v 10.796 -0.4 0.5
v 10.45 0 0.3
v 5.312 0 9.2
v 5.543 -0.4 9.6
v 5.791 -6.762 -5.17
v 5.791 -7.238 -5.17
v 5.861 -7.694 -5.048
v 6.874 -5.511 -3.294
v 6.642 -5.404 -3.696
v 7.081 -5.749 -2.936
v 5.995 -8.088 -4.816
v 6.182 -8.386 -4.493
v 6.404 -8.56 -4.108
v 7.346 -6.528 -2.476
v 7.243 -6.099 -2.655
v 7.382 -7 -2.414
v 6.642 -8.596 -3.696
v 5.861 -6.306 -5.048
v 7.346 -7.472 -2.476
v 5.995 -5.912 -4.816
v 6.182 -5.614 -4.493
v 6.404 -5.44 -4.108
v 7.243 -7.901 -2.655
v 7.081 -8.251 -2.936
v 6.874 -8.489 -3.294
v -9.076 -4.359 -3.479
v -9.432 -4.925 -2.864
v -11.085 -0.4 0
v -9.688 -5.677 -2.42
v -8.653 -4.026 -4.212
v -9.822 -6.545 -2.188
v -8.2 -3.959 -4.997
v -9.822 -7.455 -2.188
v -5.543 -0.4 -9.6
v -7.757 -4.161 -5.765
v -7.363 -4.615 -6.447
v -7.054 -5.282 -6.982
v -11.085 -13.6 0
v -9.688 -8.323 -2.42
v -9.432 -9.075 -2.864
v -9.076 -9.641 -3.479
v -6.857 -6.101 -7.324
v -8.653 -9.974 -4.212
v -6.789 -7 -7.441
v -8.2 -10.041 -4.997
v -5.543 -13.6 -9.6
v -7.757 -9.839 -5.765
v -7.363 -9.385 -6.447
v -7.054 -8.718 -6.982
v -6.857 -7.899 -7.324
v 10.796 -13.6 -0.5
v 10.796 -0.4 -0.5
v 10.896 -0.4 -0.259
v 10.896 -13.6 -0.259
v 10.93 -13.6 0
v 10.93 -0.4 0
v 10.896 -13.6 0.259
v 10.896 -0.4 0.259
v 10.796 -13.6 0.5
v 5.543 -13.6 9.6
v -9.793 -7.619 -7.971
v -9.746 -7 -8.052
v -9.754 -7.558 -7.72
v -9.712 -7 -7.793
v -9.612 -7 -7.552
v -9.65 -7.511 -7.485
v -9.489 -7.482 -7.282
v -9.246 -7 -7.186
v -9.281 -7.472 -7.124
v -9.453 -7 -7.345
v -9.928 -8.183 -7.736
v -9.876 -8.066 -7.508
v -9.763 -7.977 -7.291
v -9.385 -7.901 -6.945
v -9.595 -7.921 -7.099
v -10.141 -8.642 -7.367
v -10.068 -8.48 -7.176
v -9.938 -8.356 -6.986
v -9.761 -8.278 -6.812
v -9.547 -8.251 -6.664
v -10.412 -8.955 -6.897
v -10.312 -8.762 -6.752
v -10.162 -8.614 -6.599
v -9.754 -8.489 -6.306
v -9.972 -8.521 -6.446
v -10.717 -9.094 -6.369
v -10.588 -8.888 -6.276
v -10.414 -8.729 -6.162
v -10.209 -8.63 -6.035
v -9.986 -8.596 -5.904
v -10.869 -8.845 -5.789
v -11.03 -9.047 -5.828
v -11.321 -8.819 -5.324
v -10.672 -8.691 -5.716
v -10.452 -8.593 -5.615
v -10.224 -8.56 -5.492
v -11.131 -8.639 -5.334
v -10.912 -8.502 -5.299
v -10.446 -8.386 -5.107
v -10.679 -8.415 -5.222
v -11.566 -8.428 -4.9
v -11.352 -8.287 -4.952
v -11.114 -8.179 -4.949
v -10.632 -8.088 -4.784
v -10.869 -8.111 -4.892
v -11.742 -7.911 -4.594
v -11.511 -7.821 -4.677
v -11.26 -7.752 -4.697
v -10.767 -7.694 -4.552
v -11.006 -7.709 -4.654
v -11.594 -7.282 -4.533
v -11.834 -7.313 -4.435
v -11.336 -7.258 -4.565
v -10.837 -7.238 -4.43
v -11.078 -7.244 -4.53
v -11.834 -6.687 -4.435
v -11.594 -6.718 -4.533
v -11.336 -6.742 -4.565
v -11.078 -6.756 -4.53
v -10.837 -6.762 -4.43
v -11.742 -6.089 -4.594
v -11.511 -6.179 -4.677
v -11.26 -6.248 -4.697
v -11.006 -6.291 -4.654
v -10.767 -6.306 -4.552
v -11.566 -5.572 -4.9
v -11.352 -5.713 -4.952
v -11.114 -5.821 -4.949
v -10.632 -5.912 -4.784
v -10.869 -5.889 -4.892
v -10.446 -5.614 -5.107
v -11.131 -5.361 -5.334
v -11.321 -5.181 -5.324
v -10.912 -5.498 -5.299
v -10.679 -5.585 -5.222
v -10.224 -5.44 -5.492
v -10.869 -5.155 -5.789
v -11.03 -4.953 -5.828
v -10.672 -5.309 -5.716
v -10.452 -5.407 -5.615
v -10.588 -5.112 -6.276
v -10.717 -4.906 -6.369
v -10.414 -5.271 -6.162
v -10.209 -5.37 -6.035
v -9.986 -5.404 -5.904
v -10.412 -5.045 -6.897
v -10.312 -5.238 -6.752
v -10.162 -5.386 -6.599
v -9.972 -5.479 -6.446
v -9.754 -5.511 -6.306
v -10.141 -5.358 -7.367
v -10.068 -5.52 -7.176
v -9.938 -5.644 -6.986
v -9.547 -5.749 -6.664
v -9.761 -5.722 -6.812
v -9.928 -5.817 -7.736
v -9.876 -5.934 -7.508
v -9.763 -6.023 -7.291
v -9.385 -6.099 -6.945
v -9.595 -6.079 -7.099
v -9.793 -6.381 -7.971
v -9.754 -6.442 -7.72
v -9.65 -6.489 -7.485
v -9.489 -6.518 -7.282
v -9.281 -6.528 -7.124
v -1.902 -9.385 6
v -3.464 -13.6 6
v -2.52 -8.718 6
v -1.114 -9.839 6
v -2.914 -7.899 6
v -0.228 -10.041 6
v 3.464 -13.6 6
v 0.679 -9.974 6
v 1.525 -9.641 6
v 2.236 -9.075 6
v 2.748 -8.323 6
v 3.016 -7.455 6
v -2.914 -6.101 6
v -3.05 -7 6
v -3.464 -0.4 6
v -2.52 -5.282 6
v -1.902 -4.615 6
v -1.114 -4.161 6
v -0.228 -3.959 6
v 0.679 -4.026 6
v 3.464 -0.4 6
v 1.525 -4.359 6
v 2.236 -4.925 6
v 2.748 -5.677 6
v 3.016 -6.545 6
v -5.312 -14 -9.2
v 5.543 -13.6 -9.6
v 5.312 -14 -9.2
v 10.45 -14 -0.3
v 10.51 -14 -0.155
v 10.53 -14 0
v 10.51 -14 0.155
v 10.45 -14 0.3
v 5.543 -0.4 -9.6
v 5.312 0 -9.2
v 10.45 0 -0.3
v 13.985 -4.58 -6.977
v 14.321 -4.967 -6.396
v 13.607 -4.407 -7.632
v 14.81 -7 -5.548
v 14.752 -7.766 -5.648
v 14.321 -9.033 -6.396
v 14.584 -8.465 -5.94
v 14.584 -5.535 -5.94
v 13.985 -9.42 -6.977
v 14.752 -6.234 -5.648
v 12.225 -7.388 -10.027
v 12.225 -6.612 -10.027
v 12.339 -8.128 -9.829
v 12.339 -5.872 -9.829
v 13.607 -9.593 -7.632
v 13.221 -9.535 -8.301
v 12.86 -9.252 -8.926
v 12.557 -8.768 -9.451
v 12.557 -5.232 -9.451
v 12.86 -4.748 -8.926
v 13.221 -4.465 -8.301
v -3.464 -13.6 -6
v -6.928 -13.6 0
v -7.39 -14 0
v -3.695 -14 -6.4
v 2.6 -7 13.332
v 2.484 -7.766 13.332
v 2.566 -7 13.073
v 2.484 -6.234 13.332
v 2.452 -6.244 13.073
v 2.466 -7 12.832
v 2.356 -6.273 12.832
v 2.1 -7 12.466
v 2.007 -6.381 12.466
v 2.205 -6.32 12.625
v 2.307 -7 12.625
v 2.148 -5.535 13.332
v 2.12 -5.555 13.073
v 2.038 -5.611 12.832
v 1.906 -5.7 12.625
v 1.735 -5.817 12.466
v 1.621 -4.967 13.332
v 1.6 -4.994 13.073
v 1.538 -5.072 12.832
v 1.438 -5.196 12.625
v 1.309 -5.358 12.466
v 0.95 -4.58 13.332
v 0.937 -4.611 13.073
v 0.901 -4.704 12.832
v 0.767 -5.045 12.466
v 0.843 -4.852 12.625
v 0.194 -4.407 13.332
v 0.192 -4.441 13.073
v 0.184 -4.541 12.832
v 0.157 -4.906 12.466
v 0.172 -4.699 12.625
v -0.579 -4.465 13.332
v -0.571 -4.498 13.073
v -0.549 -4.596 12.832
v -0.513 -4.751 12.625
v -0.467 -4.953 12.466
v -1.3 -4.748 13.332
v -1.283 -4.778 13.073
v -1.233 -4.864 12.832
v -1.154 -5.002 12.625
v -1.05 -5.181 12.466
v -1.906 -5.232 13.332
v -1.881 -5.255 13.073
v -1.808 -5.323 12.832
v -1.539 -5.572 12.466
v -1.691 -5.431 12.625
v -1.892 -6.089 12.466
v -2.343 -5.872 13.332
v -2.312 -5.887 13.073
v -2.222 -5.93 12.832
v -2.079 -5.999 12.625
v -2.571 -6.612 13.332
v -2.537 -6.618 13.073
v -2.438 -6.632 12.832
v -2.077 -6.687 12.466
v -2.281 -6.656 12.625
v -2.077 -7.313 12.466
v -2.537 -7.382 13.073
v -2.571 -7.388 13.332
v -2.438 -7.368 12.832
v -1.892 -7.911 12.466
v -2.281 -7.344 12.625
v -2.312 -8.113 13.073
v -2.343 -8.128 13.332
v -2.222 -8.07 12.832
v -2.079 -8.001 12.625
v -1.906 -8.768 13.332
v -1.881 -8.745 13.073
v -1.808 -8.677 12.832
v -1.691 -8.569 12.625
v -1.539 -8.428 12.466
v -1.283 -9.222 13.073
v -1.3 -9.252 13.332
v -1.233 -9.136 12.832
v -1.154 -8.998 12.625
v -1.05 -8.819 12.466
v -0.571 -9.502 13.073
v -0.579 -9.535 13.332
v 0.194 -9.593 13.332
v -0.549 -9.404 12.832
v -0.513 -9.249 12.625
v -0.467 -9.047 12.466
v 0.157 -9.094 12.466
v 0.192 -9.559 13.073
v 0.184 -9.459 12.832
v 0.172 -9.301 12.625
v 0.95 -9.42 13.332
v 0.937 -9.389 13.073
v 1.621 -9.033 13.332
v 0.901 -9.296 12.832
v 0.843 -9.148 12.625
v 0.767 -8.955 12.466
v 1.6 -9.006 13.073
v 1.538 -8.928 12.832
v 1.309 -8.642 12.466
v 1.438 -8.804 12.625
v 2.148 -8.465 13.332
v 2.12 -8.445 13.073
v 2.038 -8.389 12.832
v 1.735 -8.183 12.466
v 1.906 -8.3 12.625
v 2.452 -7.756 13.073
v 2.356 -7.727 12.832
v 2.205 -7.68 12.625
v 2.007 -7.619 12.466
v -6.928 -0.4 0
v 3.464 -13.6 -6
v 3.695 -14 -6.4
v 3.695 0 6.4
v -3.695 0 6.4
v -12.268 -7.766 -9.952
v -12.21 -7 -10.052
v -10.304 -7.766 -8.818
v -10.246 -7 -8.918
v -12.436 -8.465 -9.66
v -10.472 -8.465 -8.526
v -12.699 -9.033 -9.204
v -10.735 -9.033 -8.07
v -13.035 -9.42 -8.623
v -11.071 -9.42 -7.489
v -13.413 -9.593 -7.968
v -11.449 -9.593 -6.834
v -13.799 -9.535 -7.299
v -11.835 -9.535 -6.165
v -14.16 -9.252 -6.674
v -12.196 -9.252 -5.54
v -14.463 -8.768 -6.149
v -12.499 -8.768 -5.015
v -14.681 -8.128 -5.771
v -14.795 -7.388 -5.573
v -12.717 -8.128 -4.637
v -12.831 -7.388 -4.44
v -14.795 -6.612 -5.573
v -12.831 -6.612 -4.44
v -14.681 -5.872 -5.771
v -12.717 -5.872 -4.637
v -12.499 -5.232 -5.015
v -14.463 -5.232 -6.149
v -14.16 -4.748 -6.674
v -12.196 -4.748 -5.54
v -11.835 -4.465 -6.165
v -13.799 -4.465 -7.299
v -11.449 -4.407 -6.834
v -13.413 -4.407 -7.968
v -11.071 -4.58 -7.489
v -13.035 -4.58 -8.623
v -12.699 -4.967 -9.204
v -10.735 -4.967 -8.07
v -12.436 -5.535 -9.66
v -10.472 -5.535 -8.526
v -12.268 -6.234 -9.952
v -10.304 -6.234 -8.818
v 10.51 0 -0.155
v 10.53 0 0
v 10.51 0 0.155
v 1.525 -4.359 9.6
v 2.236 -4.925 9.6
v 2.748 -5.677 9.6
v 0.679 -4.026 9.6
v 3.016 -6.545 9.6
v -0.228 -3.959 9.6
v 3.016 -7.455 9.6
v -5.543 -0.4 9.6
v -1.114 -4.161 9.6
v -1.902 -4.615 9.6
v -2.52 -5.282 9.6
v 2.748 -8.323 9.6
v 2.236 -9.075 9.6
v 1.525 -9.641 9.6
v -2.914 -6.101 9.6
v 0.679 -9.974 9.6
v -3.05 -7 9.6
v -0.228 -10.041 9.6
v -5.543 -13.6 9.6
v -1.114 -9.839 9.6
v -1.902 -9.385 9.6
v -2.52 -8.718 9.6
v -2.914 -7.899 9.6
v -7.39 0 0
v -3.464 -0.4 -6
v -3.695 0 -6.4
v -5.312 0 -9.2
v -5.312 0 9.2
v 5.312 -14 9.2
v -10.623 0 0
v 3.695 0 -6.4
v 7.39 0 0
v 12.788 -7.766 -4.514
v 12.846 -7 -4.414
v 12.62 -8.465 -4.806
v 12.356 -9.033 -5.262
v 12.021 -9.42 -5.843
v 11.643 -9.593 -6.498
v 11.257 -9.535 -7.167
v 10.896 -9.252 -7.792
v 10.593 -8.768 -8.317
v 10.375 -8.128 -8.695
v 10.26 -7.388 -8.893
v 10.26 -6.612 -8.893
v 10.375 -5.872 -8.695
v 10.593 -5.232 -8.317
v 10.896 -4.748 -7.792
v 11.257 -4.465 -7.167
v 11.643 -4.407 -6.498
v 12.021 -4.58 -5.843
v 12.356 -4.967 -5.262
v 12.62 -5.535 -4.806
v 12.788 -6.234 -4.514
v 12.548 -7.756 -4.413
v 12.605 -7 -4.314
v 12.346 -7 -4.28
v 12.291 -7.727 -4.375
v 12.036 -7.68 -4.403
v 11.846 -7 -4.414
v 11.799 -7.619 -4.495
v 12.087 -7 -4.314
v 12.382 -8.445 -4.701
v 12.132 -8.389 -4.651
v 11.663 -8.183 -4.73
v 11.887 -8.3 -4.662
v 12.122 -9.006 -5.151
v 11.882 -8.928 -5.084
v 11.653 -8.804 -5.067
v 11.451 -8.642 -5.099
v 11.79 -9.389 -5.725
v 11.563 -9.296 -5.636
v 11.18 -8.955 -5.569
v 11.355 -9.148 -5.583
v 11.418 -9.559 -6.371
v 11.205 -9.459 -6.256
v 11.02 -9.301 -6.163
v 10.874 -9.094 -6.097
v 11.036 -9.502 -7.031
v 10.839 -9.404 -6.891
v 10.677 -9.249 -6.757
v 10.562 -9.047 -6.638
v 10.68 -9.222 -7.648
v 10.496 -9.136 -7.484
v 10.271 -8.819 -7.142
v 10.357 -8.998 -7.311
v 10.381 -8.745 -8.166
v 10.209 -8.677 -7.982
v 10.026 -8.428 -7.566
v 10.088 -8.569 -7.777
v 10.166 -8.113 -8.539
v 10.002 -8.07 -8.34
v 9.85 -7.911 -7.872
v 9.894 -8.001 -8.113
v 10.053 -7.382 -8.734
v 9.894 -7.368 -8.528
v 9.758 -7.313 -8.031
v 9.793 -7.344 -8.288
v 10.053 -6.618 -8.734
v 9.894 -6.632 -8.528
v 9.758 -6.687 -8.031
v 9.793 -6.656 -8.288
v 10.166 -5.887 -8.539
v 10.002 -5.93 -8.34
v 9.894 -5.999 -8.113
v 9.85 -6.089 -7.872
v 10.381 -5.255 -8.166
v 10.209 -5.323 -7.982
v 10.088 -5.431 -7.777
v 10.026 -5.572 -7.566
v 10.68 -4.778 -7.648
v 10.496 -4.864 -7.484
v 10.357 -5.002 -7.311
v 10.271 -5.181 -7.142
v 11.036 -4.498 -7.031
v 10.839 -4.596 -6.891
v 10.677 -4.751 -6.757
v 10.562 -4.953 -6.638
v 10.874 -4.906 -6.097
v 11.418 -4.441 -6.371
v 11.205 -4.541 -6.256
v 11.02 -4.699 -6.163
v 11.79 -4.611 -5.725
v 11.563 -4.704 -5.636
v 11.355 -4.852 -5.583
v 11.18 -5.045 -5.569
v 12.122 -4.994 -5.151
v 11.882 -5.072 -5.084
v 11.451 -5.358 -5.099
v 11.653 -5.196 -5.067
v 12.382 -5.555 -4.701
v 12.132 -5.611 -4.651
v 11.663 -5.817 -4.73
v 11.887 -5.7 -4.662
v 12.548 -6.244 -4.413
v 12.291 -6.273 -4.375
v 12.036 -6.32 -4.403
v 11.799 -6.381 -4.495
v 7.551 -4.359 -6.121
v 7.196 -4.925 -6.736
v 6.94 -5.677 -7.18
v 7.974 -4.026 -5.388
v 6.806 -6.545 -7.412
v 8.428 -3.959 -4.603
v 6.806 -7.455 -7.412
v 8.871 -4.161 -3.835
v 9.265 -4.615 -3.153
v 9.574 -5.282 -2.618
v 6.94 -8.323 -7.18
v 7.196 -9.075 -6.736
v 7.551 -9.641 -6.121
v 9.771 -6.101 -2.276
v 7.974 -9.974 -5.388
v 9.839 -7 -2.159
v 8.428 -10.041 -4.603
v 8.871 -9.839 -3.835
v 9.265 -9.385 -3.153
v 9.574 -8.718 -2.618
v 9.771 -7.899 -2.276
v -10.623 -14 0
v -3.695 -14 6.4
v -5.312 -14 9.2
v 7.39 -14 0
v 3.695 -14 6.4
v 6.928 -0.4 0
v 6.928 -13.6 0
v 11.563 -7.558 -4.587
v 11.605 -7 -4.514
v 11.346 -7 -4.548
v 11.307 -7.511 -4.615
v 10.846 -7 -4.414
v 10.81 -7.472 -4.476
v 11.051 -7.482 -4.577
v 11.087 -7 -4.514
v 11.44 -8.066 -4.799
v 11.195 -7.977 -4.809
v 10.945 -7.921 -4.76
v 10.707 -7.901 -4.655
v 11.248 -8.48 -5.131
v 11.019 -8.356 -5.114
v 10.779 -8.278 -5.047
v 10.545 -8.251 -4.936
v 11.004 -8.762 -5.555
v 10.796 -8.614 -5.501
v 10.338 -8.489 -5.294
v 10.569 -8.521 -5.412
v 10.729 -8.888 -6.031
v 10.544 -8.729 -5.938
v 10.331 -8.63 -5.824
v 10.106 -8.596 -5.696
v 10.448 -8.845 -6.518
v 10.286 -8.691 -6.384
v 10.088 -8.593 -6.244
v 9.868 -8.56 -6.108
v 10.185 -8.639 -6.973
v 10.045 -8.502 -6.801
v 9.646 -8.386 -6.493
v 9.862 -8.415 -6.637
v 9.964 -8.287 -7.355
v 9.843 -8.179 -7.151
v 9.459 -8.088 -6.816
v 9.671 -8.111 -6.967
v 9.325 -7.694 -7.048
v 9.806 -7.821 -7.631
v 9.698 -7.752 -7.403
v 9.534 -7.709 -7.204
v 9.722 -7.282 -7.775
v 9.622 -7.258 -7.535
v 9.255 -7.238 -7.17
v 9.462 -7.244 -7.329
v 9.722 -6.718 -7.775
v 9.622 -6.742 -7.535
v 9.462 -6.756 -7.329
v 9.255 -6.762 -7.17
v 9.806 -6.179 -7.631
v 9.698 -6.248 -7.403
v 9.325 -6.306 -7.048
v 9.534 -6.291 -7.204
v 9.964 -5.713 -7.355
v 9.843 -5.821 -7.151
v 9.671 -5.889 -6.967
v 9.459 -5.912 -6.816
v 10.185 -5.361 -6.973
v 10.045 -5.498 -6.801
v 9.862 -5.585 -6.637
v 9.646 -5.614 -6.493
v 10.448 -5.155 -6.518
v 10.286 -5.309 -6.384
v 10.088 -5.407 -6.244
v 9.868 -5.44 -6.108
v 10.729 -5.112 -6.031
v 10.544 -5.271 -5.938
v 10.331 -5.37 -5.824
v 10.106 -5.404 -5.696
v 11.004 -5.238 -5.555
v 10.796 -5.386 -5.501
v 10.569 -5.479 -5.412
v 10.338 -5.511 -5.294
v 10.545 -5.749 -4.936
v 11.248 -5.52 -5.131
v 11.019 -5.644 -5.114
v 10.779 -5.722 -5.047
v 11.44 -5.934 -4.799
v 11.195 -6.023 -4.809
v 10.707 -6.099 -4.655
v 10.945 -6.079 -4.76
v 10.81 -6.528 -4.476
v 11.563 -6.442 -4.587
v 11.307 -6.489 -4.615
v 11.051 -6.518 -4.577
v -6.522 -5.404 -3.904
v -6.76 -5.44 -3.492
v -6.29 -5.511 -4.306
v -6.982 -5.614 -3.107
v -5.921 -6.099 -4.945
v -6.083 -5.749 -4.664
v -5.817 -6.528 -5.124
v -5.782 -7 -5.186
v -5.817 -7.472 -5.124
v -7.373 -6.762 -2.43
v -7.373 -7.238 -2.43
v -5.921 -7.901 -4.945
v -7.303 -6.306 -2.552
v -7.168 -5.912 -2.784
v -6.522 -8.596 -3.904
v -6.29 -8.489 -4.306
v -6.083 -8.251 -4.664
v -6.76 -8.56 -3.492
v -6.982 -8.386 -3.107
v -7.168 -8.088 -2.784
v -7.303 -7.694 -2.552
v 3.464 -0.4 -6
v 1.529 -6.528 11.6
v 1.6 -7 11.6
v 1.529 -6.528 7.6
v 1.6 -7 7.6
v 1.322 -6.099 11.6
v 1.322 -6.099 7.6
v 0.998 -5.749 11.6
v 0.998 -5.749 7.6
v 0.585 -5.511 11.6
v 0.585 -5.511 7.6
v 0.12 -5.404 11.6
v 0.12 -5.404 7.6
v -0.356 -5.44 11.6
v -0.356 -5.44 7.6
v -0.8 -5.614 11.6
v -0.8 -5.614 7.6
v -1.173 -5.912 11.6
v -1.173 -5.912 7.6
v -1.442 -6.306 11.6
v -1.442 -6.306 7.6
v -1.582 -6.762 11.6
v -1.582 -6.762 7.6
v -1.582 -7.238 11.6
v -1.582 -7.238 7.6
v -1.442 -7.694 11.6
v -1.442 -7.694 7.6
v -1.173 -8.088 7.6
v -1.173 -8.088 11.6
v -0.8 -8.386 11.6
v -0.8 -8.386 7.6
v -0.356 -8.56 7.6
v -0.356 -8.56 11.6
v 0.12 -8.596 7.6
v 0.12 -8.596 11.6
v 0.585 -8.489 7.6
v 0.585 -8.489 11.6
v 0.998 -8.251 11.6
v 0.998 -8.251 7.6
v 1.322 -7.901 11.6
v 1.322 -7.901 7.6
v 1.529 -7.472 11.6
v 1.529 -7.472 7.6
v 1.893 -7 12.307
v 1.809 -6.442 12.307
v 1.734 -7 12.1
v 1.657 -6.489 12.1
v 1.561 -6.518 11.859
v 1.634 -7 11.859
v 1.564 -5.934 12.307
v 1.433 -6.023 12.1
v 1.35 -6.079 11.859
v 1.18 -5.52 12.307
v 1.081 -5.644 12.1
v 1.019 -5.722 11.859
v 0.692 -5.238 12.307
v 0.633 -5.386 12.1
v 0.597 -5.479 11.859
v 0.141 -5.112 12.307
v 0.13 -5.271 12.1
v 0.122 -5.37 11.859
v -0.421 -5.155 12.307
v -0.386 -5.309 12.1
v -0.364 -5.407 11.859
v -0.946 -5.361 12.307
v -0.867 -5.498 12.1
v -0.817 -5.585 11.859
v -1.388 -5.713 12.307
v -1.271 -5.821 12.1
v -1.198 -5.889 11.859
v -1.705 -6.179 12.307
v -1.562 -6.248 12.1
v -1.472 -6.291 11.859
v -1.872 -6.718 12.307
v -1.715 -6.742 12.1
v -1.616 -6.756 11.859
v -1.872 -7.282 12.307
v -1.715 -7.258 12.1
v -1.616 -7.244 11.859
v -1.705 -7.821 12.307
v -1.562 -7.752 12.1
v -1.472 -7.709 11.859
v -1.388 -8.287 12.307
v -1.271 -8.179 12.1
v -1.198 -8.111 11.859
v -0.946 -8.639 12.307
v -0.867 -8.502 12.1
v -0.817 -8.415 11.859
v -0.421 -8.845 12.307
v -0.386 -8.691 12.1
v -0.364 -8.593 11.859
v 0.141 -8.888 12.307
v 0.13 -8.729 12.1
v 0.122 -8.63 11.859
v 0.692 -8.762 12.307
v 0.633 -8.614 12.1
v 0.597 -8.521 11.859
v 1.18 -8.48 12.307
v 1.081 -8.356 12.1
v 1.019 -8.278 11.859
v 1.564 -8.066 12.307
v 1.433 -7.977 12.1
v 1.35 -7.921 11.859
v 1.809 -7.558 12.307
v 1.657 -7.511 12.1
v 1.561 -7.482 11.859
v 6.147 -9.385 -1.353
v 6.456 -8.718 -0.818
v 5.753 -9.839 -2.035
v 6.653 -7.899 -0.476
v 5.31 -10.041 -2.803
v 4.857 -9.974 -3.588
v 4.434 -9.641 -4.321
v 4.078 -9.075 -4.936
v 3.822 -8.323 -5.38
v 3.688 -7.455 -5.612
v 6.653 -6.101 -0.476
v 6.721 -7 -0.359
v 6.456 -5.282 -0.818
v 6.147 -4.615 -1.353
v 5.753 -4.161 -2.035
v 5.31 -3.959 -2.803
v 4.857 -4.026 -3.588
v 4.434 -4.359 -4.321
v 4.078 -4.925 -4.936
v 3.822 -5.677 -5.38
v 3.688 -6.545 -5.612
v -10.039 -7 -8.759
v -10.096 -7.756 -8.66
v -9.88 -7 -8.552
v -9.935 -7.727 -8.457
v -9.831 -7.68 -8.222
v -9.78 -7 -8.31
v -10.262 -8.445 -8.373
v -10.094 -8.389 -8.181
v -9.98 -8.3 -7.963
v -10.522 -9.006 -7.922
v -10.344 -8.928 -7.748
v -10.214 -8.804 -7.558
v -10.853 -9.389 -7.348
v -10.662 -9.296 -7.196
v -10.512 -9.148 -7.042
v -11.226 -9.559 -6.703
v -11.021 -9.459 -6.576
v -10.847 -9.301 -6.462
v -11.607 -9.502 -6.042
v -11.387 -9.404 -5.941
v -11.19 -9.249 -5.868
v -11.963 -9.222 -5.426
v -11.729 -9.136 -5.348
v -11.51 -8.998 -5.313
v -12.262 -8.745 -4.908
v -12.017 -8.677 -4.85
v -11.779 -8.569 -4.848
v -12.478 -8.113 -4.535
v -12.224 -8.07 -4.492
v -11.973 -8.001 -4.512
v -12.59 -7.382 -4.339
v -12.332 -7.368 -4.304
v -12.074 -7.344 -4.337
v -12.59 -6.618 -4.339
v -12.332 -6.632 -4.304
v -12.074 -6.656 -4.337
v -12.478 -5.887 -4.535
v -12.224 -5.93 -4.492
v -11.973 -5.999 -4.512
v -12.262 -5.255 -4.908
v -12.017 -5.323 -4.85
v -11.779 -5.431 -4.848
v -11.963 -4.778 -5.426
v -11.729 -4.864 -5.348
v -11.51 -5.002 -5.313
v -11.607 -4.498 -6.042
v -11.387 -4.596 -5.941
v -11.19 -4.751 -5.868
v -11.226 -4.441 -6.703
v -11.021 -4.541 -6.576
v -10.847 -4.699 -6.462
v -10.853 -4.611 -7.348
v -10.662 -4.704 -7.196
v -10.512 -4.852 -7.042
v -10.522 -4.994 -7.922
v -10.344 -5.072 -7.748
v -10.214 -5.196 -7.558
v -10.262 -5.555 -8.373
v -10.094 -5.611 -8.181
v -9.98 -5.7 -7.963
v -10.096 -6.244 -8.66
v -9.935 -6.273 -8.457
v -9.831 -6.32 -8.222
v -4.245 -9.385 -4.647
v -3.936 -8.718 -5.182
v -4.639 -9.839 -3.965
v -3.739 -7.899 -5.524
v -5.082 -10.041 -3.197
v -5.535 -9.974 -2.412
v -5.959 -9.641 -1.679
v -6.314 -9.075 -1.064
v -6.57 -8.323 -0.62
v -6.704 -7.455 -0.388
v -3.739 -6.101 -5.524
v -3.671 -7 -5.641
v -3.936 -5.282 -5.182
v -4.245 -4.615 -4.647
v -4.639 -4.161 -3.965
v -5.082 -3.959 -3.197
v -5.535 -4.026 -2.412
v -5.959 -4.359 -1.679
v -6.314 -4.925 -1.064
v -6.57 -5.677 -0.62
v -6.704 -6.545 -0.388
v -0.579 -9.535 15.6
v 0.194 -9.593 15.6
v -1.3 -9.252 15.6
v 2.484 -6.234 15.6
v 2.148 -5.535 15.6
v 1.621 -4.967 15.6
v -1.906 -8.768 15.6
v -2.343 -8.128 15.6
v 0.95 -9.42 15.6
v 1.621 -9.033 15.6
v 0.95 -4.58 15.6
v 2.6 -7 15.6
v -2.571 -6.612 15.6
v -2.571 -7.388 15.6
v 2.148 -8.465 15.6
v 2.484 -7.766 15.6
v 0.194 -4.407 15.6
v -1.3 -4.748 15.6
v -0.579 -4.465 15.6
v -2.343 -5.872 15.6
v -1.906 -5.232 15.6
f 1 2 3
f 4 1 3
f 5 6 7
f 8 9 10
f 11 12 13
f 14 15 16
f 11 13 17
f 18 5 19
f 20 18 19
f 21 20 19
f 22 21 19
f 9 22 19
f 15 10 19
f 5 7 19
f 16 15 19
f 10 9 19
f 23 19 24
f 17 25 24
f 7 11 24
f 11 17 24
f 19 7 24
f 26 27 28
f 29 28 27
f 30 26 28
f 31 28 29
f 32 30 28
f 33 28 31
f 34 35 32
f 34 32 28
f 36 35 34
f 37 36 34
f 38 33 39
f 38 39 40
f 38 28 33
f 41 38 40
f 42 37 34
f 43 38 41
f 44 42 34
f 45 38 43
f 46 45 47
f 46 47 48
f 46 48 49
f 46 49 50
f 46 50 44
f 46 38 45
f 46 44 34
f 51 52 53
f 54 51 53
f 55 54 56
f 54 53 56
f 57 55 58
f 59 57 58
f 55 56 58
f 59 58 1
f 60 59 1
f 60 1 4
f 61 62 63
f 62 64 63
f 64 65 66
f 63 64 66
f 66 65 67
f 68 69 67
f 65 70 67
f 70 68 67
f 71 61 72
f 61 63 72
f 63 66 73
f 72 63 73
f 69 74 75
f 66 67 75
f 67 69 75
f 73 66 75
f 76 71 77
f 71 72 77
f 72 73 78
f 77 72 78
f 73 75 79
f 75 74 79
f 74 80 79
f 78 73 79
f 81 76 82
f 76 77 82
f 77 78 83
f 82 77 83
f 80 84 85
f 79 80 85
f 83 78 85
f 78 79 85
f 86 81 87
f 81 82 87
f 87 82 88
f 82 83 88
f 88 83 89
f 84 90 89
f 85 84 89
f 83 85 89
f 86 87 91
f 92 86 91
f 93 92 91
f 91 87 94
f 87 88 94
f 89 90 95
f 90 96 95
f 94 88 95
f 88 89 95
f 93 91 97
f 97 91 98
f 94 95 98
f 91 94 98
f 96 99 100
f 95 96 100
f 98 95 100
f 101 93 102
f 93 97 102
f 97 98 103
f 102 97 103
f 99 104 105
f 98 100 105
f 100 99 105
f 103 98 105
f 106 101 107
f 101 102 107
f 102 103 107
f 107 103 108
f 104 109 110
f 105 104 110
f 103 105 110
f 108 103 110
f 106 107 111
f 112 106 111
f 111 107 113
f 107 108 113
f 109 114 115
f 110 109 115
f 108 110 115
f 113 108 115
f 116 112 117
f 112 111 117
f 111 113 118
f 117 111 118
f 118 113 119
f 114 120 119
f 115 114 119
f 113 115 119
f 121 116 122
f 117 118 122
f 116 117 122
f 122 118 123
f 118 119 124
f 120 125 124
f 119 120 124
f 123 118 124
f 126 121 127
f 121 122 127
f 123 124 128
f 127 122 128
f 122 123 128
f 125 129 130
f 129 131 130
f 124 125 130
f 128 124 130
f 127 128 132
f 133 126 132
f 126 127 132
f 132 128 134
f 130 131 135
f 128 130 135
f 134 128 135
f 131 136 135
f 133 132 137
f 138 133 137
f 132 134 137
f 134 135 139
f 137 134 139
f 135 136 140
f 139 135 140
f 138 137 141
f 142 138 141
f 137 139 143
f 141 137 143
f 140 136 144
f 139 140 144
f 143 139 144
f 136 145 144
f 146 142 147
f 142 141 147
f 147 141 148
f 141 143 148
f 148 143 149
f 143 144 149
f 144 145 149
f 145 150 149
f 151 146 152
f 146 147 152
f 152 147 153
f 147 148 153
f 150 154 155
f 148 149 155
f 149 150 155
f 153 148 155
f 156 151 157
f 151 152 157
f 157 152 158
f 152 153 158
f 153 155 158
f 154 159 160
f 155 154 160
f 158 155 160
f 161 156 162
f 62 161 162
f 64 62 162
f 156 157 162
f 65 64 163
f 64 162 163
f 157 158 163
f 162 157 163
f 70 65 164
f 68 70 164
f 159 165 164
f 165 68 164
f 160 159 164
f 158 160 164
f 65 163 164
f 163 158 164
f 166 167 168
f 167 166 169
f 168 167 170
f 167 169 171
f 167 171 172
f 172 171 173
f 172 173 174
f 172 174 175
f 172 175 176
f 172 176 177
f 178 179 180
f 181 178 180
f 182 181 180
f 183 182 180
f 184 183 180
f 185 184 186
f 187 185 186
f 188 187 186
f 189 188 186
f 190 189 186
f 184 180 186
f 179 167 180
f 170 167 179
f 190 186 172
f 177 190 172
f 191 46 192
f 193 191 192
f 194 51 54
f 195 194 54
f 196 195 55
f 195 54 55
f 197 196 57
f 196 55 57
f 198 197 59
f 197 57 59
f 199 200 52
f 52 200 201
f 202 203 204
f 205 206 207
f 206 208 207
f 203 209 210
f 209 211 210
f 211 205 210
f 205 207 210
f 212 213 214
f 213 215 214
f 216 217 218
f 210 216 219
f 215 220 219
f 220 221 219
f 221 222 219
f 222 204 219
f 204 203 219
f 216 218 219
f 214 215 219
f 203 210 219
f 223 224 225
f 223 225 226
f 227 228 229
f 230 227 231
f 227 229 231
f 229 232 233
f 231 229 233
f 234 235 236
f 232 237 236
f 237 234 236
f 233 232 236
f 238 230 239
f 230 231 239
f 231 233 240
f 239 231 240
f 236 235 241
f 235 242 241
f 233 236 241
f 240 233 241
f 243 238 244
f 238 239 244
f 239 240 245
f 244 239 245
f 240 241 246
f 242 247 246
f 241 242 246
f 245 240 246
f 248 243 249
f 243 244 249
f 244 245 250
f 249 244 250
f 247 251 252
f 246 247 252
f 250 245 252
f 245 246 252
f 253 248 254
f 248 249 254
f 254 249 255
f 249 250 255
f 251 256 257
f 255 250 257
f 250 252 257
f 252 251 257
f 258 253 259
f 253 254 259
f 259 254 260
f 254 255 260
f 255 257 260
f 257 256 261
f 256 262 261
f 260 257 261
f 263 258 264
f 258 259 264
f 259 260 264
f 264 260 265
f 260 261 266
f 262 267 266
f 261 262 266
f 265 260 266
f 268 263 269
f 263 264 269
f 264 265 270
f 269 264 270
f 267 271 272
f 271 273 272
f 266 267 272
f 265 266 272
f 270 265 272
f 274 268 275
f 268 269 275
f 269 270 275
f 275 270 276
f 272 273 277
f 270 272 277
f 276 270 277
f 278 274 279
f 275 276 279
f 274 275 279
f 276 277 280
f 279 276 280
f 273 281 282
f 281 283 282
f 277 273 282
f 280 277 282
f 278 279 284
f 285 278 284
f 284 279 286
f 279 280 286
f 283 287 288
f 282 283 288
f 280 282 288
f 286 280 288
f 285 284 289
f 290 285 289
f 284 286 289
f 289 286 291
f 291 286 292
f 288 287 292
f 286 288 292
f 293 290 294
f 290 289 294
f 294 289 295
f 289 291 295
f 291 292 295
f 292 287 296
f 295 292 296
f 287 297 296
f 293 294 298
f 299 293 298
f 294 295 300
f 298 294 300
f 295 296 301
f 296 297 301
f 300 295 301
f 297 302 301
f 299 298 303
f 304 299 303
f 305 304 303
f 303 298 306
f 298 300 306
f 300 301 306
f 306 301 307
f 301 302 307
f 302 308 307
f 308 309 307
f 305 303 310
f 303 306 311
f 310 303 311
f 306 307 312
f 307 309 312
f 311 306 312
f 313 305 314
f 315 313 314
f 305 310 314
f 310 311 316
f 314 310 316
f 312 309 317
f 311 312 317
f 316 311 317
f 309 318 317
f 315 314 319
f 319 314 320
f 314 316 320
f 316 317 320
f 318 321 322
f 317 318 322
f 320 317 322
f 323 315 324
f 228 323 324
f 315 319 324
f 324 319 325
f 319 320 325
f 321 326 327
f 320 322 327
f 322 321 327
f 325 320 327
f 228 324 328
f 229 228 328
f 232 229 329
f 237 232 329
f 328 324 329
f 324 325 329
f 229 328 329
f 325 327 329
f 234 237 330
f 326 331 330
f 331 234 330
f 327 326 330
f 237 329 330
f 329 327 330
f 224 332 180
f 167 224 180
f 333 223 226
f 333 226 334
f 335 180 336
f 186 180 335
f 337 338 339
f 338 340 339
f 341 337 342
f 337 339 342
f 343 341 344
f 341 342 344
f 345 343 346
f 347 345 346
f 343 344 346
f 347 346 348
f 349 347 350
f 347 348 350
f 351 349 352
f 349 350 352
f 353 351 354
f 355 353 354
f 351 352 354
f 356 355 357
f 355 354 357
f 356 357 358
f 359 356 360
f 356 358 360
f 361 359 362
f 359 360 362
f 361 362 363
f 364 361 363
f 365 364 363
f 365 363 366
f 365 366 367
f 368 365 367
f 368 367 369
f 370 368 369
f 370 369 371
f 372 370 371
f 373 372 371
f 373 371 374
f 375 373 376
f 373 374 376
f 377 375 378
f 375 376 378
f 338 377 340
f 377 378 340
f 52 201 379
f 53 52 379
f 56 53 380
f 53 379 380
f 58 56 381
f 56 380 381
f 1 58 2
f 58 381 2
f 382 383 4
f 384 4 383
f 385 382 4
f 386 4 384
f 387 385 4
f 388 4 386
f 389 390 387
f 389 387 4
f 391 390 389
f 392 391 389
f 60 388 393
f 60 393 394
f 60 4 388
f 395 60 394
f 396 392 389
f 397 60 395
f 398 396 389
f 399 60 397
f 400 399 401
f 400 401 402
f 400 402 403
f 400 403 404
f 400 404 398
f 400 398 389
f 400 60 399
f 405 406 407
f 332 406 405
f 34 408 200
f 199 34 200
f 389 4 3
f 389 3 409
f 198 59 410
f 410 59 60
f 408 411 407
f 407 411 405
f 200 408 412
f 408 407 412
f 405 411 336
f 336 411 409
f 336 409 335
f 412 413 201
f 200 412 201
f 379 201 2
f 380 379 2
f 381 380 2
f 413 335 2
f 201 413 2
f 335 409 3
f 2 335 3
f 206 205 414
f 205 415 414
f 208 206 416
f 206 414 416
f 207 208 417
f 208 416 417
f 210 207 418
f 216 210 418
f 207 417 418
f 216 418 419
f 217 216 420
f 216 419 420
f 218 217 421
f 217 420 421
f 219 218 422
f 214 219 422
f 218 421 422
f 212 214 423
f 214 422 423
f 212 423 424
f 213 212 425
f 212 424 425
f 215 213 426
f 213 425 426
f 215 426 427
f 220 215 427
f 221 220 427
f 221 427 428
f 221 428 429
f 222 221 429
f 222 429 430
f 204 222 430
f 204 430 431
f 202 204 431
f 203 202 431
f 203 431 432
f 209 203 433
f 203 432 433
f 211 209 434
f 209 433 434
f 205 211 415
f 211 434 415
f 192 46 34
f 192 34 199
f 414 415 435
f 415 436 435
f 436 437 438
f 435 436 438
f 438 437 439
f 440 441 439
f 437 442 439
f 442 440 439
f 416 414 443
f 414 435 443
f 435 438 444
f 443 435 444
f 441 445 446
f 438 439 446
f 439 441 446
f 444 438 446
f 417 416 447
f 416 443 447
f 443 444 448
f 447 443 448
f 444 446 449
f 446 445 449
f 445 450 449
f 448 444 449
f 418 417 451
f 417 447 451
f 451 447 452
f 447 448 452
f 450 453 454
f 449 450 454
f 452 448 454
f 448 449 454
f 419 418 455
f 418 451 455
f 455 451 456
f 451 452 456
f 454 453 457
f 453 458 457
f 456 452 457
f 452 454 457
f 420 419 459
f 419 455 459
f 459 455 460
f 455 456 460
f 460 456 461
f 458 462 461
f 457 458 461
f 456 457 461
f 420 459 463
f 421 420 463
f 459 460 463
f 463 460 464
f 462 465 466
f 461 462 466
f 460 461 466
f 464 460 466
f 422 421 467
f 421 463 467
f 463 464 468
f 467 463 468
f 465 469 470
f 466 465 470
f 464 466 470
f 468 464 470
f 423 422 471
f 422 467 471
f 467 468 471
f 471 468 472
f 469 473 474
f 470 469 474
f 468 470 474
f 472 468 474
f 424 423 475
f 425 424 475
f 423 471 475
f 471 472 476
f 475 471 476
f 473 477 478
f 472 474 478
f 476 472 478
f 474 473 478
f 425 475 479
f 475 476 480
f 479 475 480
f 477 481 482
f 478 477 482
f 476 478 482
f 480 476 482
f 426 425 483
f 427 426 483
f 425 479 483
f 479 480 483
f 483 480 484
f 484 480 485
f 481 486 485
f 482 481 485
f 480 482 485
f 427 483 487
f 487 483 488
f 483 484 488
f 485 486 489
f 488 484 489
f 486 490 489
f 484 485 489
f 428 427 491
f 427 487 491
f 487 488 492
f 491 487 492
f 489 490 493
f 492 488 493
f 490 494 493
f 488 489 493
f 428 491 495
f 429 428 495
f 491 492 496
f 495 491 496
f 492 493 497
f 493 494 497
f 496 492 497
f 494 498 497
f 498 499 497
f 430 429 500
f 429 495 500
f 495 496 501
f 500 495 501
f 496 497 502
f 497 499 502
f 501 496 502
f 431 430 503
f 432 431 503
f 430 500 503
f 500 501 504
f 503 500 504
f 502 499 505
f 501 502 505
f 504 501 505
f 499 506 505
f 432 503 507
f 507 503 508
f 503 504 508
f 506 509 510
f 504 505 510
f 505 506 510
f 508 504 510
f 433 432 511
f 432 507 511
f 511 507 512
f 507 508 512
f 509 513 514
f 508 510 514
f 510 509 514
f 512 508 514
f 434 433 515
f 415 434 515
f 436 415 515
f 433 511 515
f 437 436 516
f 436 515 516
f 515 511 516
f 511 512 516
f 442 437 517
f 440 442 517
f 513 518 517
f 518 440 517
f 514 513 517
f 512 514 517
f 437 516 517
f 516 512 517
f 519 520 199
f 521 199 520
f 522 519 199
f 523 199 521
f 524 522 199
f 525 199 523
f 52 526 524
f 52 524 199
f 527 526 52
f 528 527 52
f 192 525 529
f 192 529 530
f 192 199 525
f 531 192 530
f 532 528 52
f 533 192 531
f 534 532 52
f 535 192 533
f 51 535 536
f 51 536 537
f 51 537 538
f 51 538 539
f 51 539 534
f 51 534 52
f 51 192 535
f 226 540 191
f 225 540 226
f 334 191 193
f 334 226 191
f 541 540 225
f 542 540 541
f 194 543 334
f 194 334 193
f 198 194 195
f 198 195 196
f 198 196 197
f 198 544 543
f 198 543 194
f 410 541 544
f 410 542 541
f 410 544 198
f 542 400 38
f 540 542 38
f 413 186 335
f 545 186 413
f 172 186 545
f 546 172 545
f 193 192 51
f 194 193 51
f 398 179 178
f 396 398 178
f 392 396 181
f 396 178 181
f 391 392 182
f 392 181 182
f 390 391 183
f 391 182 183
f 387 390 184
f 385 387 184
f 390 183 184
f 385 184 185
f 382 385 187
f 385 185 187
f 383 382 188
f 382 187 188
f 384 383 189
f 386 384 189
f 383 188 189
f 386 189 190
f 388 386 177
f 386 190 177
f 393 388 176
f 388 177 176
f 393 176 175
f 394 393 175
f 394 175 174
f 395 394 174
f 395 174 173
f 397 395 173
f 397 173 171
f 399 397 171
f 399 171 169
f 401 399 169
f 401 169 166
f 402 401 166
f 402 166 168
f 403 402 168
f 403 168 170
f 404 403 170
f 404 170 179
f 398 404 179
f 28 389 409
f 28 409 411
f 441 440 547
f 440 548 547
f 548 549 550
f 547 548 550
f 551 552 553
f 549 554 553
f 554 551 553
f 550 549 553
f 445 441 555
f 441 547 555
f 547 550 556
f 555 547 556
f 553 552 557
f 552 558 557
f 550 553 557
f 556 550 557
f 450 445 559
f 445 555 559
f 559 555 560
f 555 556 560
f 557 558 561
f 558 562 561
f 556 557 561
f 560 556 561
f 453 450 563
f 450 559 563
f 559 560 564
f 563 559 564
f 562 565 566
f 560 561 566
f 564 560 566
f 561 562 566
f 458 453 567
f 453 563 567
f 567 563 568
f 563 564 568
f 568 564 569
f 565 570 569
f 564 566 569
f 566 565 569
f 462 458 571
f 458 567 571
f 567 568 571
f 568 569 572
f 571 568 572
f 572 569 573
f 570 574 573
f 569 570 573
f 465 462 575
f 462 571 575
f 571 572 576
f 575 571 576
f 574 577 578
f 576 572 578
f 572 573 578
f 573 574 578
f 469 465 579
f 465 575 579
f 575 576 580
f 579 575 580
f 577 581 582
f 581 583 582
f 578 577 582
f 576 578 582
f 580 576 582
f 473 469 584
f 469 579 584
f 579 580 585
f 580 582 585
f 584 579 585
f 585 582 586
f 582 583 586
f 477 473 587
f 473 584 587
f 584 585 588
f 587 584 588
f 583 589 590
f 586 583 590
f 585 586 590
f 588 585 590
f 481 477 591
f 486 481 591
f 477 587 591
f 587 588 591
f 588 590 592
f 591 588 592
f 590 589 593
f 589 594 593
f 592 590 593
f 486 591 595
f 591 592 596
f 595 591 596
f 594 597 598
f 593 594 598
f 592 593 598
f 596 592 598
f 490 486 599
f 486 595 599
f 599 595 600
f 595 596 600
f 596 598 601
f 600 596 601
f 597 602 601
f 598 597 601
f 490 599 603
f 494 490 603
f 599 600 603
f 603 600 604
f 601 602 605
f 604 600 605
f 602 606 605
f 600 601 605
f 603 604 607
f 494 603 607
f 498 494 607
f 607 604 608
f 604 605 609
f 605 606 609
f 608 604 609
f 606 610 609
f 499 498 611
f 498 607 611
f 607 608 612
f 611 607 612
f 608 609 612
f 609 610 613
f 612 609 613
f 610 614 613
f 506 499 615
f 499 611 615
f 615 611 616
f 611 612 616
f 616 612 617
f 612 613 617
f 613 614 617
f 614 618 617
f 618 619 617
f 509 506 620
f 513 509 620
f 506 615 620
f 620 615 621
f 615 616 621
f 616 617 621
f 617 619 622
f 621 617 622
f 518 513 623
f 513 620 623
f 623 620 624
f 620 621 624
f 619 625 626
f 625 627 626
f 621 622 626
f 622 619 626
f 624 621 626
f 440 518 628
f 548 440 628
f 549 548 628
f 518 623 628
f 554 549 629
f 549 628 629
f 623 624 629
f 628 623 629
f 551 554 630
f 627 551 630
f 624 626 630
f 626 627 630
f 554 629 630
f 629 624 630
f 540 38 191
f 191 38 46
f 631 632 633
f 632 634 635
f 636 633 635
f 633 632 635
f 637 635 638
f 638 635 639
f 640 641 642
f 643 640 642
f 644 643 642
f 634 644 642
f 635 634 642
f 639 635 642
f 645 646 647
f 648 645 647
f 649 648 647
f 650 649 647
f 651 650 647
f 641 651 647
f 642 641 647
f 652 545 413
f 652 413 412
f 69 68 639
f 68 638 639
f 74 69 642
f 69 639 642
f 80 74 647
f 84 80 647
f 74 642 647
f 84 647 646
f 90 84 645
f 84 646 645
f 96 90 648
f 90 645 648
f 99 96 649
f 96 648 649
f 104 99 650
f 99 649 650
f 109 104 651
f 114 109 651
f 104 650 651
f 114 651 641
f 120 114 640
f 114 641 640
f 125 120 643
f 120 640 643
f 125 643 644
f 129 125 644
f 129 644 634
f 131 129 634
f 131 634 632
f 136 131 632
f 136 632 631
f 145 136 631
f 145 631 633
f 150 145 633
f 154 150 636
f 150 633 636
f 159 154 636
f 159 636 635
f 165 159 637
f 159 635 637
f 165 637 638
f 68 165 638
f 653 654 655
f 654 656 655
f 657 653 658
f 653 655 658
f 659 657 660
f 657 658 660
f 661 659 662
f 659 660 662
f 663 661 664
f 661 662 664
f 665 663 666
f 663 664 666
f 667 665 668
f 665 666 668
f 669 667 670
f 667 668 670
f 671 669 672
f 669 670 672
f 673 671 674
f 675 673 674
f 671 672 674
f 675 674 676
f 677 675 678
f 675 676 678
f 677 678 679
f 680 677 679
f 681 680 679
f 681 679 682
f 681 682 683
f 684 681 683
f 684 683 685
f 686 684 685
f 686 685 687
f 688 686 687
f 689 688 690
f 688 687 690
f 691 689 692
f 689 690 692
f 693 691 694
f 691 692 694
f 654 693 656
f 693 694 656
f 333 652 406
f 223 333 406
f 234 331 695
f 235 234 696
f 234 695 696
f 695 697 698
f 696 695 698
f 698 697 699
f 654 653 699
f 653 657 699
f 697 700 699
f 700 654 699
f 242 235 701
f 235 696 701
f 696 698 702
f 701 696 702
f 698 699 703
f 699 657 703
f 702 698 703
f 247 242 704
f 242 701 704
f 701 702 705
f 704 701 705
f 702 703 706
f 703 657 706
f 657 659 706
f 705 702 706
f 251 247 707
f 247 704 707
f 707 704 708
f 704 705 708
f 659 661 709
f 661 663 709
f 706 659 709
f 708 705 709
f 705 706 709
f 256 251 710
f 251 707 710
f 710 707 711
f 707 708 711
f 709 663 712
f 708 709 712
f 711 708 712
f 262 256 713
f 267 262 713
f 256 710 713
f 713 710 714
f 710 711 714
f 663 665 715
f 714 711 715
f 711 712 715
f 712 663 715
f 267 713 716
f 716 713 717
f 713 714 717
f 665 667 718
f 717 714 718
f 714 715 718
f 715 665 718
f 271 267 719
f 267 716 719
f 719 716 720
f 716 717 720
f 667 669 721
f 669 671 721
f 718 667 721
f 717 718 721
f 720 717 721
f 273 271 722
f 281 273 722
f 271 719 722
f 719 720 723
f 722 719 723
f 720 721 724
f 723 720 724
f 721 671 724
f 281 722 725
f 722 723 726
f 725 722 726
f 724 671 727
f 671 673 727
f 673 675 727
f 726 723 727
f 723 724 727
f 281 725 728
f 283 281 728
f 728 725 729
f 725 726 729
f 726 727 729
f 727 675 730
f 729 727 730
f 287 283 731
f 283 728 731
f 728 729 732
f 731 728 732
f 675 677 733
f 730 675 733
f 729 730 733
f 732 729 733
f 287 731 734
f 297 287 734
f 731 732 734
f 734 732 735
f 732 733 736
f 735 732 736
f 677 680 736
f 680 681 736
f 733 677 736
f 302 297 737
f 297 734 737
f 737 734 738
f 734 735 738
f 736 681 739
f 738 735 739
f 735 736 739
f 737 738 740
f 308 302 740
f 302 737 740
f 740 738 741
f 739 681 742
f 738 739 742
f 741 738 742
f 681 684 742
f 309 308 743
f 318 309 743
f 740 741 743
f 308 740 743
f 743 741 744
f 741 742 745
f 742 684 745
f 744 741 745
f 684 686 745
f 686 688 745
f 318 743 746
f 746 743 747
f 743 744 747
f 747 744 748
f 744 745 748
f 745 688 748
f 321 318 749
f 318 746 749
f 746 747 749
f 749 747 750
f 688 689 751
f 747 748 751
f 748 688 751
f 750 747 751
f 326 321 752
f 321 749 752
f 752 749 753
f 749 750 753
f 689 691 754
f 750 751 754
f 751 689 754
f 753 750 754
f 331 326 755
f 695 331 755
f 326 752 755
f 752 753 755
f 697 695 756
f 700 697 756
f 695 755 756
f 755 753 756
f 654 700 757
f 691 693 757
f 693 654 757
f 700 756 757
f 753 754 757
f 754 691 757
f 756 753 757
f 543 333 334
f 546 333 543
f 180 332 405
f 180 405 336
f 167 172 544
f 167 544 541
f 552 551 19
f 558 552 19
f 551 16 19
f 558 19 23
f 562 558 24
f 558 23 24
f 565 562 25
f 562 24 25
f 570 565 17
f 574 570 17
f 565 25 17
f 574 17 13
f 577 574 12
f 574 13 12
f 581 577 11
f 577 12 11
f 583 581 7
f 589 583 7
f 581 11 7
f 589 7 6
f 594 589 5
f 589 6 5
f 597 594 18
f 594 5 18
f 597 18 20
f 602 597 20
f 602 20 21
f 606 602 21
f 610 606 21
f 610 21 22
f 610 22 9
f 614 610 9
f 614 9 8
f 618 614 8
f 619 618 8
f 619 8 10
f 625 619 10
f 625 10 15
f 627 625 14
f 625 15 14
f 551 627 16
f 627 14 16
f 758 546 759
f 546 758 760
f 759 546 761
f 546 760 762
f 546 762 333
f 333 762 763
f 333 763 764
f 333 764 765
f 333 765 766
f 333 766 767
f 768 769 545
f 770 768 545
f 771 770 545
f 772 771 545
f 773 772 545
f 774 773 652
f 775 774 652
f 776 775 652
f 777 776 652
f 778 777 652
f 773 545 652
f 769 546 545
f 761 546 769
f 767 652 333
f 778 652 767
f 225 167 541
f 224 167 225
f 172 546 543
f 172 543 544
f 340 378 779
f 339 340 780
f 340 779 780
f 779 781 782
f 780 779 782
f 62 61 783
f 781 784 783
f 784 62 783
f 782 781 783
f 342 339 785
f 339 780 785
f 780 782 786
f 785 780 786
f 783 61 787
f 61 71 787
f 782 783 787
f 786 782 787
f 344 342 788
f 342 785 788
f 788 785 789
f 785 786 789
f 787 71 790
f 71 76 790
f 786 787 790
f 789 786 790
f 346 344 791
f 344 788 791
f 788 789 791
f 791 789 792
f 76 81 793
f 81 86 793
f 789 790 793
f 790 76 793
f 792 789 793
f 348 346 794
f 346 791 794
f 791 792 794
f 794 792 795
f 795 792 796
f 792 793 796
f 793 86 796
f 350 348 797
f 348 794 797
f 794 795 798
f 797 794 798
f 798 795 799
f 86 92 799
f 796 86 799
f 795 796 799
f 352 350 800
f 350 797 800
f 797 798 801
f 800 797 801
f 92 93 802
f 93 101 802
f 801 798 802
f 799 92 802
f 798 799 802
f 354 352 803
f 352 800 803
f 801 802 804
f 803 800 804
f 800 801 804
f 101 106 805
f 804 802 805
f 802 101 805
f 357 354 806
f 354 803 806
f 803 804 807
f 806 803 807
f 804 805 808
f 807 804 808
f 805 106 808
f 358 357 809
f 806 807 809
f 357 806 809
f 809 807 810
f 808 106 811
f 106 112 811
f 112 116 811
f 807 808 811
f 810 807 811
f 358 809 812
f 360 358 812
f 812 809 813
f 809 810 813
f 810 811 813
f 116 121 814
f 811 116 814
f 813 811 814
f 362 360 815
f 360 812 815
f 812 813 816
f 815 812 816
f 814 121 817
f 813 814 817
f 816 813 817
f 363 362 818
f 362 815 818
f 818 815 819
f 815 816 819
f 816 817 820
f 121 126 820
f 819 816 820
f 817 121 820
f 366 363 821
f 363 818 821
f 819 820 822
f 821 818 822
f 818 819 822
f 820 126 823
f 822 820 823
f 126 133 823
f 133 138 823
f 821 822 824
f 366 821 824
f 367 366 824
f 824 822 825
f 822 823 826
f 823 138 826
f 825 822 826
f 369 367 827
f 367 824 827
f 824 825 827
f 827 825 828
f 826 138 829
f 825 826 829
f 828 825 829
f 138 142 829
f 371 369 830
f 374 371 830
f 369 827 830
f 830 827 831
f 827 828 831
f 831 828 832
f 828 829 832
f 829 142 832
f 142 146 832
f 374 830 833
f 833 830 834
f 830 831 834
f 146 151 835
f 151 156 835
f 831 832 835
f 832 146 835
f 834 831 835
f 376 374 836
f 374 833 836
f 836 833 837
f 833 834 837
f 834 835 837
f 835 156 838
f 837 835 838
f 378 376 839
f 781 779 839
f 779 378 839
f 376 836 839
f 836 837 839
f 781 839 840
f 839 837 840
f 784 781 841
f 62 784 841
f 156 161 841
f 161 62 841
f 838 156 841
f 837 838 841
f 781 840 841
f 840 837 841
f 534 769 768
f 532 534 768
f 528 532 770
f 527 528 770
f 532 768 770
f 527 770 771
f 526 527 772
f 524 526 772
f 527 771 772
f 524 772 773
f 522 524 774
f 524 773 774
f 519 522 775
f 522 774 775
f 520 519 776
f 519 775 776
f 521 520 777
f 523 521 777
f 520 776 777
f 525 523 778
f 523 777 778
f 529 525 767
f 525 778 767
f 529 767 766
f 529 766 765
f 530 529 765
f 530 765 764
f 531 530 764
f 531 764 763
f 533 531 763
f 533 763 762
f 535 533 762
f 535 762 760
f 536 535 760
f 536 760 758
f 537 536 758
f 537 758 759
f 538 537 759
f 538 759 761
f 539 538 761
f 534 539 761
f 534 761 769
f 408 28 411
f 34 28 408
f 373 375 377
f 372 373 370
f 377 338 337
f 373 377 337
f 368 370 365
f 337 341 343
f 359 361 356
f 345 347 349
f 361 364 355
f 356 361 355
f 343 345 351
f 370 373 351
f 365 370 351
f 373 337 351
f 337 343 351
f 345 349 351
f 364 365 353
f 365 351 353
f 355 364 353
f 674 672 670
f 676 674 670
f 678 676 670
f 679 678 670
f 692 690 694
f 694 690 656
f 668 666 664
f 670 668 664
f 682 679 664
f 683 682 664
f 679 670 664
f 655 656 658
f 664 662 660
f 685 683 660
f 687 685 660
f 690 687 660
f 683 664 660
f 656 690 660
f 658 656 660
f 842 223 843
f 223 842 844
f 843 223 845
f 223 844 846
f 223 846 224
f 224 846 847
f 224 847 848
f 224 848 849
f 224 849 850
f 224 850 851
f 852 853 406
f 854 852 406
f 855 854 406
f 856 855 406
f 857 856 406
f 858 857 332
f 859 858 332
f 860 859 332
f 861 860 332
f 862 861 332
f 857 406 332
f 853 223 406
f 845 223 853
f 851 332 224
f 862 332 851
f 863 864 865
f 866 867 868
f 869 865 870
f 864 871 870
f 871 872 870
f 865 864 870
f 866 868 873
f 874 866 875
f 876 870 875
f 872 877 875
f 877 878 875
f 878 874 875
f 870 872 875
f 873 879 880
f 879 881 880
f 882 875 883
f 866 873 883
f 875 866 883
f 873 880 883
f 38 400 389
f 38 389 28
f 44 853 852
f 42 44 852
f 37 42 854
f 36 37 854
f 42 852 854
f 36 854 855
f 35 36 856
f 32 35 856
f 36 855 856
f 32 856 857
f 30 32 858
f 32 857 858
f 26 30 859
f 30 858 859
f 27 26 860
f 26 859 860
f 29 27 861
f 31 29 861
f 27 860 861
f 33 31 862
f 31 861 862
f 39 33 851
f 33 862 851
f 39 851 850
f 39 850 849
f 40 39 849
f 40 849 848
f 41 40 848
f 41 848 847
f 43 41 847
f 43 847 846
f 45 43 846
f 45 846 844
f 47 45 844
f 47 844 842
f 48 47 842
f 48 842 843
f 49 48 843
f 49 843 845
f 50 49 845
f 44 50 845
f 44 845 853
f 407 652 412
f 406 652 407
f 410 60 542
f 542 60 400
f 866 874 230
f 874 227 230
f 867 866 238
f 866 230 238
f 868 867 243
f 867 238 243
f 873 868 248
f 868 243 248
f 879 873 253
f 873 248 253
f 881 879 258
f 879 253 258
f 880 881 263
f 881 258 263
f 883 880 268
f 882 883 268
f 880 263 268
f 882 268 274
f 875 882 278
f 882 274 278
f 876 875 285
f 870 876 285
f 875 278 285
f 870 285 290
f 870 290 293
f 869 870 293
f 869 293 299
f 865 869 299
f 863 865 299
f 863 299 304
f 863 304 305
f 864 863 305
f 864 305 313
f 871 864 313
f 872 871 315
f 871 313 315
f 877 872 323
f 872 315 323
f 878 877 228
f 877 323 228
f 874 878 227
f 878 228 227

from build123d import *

# Parameters (mm, degrees)
SALIENTE_EXTRUIR1_DEPTH             = 14
CORTAR_EXTRUIR1_DEPTH               = 15
DI_METRO_DE_TALADRO_6_1_6_1_1_D     = 6.1
DI_METRO_DE_TALADRO_6_1_6_1_1_DEPTH = 3.6
DI_METRO_DE_TALADRO_6_1_6_1_2_D     = 6.1
DI_METRO_DE_TALADRO_6_1_6_1_2_DEPTH = 3.6
DI_METRO_DE_TALADRO_6_1_6_1_3_D     = 6.1
DI_METRO_DE_TALADRO_6_1_6_1_3_DEPTH = 3.6
REDONDEO2_R                         = 1
CHAFL_N1_SIZE                       = 0.4


with BuildPart() as part:
    # Croquis1 → Saliente-Extruir1 (new body)
    with BuildSketch(Plane.XZ.offset(14)):
        Polygon((-5.542562584, -9.6), (5.542562584, -9.6), (11.085125168, 0), (5.542562584, 9.6), (-5.542562584, 9.6), (-11.085125168, 0), align=None)
    extrude(amount=-SALIENTE_EXTRUIR1_DEPTH)

    # Croquis2 → Cortar-Extruir1 (cut, through all)
    with BuildSketch(Plane(origin=(0, 0, 0), x_dir=(-1, 0, 0), z_dir=(0, 1, 0))):
        Polygon((6.92820323, 0), (3.464101615, 6), (-3.464101615, 6), (-6.92820323, 0), (-3.464101615, -6), (3.464101615, -6), align=None)
    extrude(amount=-CORTAR_EXTRUIR1_DEPTH, mode=Mode.SUBTRACT)

    # Diámetro de taladro Ø6.1 (6.1)1
    with Locations(Plane.XY.offset(9.6)):
        with Locations((0, -7)):
            Hole(DI_METRO_DE_TALADRO_6_1_6_1_1_D / 2, depth=DI_METRO_DE_TALADRO_6_1_6_1_1_DEPTH)

    # Diámetro de taladro Ø6.1 (6.1)2
    with Locations(Plane(origin=(-8.313843876, 0, -4.8), x_dir=(-0.5, 0, 0.866025404), z_dir=(-0.866025404, 0, -0.5))):
        with Locations((0, -7)):
            Hole(DI_METRO_DE_TALADRO_6_1_6_1_2_D / 2, depth=DI_METRO_DE_TALADRO_6_1_6_1_2_DEPTH)

    # Diámetro de taladro Ø6.1 (6.1)3
    with Locations(Plane(origin=(8.313843876, 0, -4.8), x_dir=(-0.5, 0, -0.866025404), z_dir=(0.866025404, 0, -0.5))):
        with Locations((0, -7)):
            Hole(DI_METRO_DE_TALADRO_6_1_6_1_3_D / 2, depth=DI_METRO_DE_TALADRO_6_1_6_1_3_DEPTH)

    # Redondeo2
    redondeo2_edges = [part.edges().sort_by_distance(p)[0] for p in [
        (11.085125168, -7, 0),
    ]]
    fillet(redondeo2_edges, radius=REDONDEO2_R)

    # Chaflán1
    chafl_n1_edges = [part.edges().sort_by_distance(p)[0] for p in [
        (8.169506309, 0, -5.05),
        (0, 0, 9.6),
        (-8.313843876, 0, 4.8),
        (-5.196152423, -14, -3),
        (0, -14, -6),
        (5.196152423, -14, -3),
        (5.196152423, -14, 3),
        (0, -14, 6),
        (-5.196152423, -14, 3),
        (-5.196152423, 0, -3),
        (-5.196152423, 0, 3),
        (0, 0, 6),
        (5.196152423, 0, 3),
        (5.196152423, 0, -3),
        (0, 0, -6),
        (-8.313843876, 0, -4.8),
        (8.169506309, -14, 5.05),
        (10.93042463, -14, 0),
        (8.169506309, 0, 5.05),
        (10.93042463, 0, 0),
        (-8.313843876, -14, 4.8),
        (0, -14, 9.6),
        (8.169506309, -14, -5.05),
        (0, -14, -9.6),
        (-8.313843876, -14, -4.8),
        (0, 0, -9.6),
    ]]
    chamfer(chafl_n1_edges, length=CHAFL_N1_SIZE)


with BuildPart() as body_2:
    # Croquis9 → Revolución1 (revolve)
    with BuildSketch(Plane(origin=(0, -7, 0), x_dir=(1, 0, 0), z_dir=(0, 1, 0))):
        with BuildLine():
            Line((1.6, -7.6), (0, -7.6))
            Line((0, -7.6), (0, -15.6))
            Line((0, -15.6), (2.6, -15.6))
            Line((2.6, -15.6), (2.6, -13.332050808))
            ThreePointArc((2.6, -13.332050808), (2.466025404, -12.832050808), (2.1, -12.466025404))
            ThreePointArc((2.1, -12.466025404), (1.733974596, -12.1), (1.6, -11.6))
            Line((1.6, -11.6), (1.6, -7.6))
        make_face()
    revolve(axis=Axis((0, -7, 7.6), (0, 0, 1)))


with BuildPart() as body_3:
    # Croquis10 → Revolución2 (revolve)
    with BuildSketch(Plane.XZ.offset(7)):
        with BuildLine():
            Line((-5.781793069, -5.185640646), (-6.581793069, -3.8))
            Line((-6.581793069, -3.8), (-13.509996299, -7.8))
            Line((-13.509996299, -7.8), (-12.209996299, -10.05166605))
            Line((-12.209996299, -10.05166605), (-10.245894684, -8.917691454))
            ThreePointArc((-10.245894684, -8.917691454), (-9.87986928, -8.55166605), (-9.745894684, -8.05166605))
            ThreePointArc((-9.745894684, -8.05166605), (-9.611920088, -7.55166605), (-9.245894684, -7.185640646))
            Line((-9.245894684, -7.185640646), (-5.781793069, -5.185640646))
        make_face()
    revolve(axis=Axis((-5.981793069, -7, -3.453589838), (-0.866025404, 0, -0.5)))


with BuildPart() as body_4:
    # Croquis11 → Revolución3 (revolve)
    with BuildSketch(Plane.XZ.offset(7)):
        with BuildLine():
            Line((7.381793069, -2.414359354), (6.581793069, -3.8))
            Line((6.581793069, -3.8), (13.509996299, -7.8))
            Line((13.509996299, -7.8), (14.809996299, -5.54833395))
            Line((14.809996299, -5.54833395), (12.845894684, -4.414359354))
            ThreePointArc((12.845894684, -4.414359354), (12.345894684, -4.280384758), (11.845894684, -4.414359354))
            ThreePointArc((11.845894684, -4.414359354), (11.345894684, -4.54833395), (10.845894684, -4.414359354))
            Line((10.845894684, -4.414359354), (7.381793069, -2.414359354))
        make_face()
    revolve(axis=Axis((8.313843876, -7, -4.8), (0.866025404, 0, -0.5)))


solid = Compound([part.part, body_2.part, body_3.part, body_4.part])
